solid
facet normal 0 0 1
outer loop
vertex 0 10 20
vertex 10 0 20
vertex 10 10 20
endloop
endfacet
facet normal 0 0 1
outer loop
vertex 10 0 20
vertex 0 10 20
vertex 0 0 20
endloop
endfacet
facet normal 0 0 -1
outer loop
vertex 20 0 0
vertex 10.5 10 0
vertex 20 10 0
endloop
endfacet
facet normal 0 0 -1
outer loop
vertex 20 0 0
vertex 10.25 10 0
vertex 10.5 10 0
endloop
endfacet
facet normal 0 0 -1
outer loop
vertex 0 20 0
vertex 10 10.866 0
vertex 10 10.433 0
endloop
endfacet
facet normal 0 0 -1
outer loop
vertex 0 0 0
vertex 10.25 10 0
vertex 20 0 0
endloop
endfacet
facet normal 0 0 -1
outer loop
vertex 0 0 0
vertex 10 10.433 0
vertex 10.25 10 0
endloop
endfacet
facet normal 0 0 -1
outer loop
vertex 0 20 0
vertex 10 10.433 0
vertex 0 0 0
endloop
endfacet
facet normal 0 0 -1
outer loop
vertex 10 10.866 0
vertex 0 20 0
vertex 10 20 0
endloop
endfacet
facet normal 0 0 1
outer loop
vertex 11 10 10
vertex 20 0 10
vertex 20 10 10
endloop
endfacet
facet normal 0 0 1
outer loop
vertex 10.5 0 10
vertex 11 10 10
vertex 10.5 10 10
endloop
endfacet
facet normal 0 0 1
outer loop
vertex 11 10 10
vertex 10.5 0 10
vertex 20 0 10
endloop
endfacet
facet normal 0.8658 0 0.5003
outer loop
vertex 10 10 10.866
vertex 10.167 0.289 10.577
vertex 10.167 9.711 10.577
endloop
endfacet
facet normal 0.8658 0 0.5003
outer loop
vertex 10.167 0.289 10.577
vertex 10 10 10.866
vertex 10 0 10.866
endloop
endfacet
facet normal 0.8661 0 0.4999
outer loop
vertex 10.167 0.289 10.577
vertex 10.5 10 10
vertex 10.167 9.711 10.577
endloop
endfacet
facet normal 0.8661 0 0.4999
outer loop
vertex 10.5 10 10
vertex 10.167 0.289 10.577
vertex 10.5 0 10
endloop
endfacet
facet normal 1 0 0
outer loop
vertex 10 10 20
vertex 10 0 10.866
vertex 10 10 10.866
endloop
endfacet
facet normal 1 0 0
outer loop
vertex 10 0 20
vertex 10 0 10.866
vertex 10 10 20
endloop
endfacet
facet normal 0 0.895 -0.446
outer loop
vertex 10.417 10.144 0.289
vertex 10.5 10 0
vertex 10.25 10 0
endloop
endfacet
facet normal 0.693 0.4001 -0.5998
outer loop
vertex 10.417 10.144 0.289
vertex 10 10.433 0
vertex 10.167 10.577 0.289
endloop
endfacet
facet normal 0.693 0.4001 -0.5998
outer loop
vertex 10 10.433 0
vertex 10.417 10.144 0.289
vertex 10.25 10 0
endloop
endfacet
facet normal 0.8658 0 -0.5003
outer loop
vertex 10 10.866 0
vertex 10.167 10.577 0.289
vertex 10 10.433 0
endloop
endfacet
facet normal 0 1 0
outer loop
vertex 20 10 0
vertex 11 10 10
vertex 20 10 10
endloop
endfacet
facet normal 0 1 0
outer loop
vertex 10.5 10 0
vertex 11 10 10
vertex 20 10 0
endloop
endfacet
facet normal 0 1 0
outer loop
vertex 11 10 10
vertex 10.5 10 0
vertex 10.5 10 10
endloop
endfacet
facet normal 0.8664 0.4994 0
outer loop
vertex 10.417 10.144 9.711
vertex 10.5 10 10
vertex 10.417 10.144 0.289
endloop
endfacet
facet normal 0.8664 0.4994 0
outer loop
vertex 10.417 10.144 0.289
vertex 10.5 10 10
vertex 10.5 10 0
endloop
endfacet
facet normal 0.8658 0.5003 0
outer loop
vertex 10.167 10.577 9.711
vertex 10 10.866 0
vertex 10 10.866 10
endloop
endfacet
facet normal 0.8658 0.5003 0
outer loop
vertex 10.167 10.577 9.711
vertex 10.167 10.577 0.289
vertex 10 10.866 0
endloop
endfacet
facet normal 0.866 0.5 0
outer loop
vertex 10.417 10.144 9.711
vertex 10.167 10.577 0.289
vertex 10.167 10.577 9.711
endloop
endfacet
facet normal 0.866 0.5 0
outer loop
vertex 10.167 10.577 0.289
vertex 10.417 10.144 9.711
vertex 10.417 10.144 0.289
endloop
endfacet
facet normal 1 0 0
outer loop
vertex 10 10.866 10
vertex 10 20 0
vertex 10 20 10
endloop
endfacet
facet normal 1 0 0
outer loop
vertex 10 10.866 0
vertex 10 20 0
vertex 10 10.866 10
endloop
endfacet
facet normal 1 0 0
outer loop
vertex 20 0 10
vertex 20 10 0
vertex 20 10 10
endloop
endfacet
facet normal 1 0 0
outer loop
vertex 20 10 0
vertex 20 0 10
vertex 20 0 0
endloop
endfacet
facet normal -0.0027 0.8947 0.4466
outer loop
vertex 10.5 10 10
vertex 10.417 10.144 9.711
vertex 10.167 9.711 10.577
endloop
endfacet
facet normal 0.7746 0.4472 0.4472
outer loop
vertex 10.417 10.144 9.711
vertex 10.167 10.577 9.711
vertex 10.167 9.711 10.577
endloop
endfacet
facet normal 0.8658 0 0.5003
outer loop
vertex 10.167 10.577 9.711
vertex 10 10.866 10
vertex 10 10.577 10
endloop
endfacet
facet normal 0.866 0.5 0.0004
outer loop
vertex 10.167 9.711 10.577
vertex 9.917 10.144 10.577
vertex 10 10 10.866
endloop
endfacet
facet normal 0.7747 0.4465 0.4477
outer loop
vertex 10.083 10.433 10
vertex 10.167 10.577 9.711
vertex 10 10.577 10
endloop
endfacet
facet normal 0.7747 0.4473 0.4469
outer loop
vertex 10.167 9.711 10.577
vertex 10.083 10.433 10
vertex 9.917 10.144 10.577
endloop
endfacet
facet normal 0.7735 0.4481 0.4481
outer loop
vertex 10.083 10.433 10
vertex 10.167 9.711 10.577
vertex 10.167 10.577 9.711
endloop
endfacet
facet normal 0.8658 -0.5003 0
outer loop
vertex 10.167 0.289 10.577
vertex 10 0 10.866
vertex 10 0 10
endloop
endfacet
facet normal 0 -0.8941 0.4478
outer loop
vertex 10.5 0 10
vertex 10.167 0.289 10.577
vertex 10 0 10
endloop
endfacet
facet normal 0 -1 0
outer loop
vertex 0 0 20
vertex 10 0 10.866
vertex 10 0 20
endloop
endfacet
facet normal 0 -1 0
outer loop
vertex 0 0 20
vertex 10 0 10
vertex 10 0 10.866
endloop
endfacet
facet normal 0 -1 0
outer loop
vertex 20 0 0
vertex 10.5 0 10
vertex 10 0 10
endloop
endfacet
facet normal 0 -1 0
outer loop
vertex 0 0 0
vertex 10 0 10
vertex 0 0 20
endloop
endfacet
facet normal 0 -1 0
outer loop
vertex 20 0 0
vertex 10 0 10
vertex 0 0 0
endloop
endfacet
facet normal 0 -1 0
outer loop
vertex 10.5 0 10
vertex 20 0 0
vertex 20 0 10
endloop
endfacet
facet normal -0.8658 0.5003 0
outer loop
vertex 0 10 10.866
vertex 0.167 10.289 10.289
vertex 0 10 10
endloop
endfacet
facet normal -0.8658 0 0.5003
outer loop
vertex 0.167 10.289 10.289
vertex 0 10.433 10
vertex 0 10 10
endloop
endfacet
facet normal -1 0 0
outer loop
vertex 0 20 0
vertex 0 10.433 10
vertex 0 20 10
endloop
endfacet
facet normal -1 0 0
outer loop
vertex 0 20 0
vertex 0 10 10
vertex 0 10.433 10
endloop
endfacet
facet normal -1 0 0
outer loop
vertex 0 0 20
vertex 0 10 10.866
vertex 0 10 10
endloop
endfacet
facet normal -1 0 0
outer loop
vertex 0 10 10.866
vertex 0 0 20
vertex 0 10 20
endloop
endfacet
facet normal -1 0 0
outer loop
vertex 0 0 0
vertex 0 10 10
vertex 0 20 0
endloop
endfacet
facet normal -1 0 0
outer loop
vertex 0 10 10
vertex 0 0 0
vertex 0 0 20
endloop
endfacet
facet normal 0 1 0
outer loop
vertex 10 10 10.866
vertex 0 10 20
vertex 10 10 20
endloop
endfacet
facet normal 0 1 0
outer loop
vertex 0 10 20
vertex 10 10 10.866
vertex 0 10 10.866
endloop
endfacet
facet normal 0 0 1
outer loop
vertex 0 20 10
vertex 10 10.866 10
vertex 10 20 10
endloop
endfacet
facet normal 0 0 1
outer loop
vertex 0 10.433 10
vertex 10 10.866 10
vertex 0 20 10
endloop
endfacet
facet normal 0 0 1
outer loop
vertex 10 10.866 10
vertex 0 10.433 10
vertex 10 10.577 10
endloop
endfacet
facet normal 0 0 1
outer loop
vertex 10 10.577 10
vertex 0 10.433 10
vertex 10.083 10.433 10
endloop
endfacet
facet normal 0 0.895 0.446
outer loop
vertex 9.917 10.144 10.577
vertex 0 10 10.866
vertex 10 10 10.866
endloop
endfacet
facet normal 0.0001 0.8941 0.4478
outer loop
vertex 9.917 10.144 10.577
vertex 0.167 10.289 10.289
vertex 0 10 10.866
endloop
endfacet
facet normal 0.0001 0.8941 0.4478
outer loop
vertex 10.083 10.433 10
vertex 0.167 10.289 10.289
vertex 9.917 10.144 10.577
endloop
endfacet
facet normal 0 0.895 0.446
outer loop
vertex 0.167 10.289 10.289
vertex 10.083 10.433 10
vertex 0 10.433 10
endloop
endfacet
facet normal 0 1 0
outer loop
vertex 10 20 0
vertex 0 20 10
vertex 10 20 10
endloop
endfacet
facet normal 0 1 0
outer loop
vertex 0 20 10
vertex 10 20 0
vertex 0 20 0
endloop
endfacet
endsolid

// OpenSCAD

// by: Scorch
// http://www.scorchworks.com/Blog/openscad-modules-for-automatic-fillets-and-radii/
// www.scorchworks.com
// 12/29/2015

// PARAMETERS

sample_R    = 1;      // Radius of the fillet/round to be added

sample_OB   = 1000;   // Outer boundary (should be larger than model outer boundary)

sample_axis = "xyz";  // ["xyz":"xyz",x:x,y:y,z:z]
                      // axes to round choose one (x,y,z, or xyz)

sample_fn   = 6;      // number of facets on radius (per 360 degrees)

MAKE_EXAMPLE = 1;    // [0:Generate sample base part,1: Add fillets to base part,2: Add rounds to base part,3: Add fillets and rounds to base part,4: Add local fillets to base part,5: Add local rounds to base part,6: Add local fillets and local rounds to base part, 7: Show transparent local area selection box on base part]

//-1: Do not make example part
// 0: Generate sample base part
// 1: Add fillets to base part 
// 2: Add rounds to base part 
// 3: Add fillets and rounds to base part 
// 4: Add local fillets to base part 
// 5: Add local rounds to base part 
// 6: Add local fillets and local rounds to base part 
// 7: Show transparent local area selection box on base part 
//

//////////////////////////////////////////////////////////////////////////
//////////////////////////////////////////////////////////////////////////

// The add_fillets module will either auto fillet the whole model or
// a section of the model depending on if ther are one or two children.
// 1 child:       Fillet the whole model
// Two children:  Fillet the first child in the area that is
//                 intersected by the second child 
module add_fillets(R=1,OB=1000,axis="xyz",fn=10)
{
    fn_even = ceil(fn/2)*2;
    if ($children==1)
    {
        minkowski_fillets(R=R,OB=OB,axis=axis,fn=fn_even)
        {
            children(0);
        }
    }
    if ($children==2)
    {
        union()
        {
            minkowski_fillets(R=R,OB=OB,axis=axis,fn=fn_even)
            {
                intersection()
                {
                    children(0);
                    children(1);
                }
            }
            difference()
            {
                children(0);
                children(1);
            }
        }
    }
}


// The add_rounds module will either auto round the whole model or
// a section of the model depending on if ther are one or two children.
// 1 child:       Round the whole model
// Two children:  Round the first child in the area that is
//                  intersected by the second child 
module add_rounds(R=1,OB=1000,axis="xyz",fn=10)
{
    fn_even = ceil(fn/2)*2;
    if ($children==1)
    {
        minkowski_rounds(R=R,OB=OB,axis=axis,fn=fn_even)
        {
            children(0);
        }
    }
    if ($children==2)
    {
        union()
        {
            minkowski_rounds(R=R,OB=OB,axis=axis,fn=fn_even)
            {
                intersection()
                {
                    children(0);
                    minkowski()
                    {
                        children(1);
                        if (axis=="x")   rotate([0 ,90,0]) cylinder(r=R,$fn=fn_even,center=true);
                        if (axis=="y")   rotate([90,0 ,0]) cylinder(r=R,$fn=fn_even,center=true);
                        if (axis=="z")   rotate([0 ,0 ,0]) cylinder(r=R,$fn=fn_even,center=true);
                        if (axis=="xyz") sphere(r=R,$fn=fn_even);
                    }
                }
            }
            difference()
            {
                children(0);
                children(1);
            }
        }
    }
}




module minkowski_fillets(R=1,OB=1000,axis="xyz",fn=10)
{
    OBplus=OB+4*R;
    fn_even = ceil(fn/2)*2;
    echo(fn_even);
    difference()
    {
        cube([OB,OB,OB],center=true);
        minkowski()
        {   
            difference()
            {
                cube([OBplus,OBplus,OBplus],center=true);
                minkowski()
                {
                    children(0);
                    if (axis=="x")   rotate([0 ,90,0]) cylinder(r=R,$fn=fn_even,center=true);
                    if (axis=="y")   rotate([90,0 ,0]) cylinder(r=R,$fn=fn_even,center=true);
                    if (axis=="z")   rotate([0 ,0 ,0]) cylinder(r=R,$fn=fn_even,center=true);
                    if (axis=="xyz") sphere(r=R,$fn=fn);
                }
            }
            if (axis=="x")   rotate([0 ,90,0]) cylinder(r=R,$fn=fn_even,center=true);
            if (axis=="y")   rotate([90,0 ,0]) cylinder(r=R,$fn=fn_even,center=true);
            if (axis=="z")   rotate([0 ,0 ,0]) cylinder(r=R,$fn=fn_even,center=true);
            if (axis=="xyz") sphere(r=R,$fn=fn_even);
        }
    }
}


module minkowski_rounds(R=1,OB=1000,axis="xyz",fn=10)
{
    OBplus=OB+4*R;
    fn_even = ceil(fn/2)*2;
    minkowski()
    {  
        difference()
        {
            cube([OB,OB,OB],center=true);
            minkowski()
            {
                difference()
                {
                    cube([OBplus,OBplus,OBplus],center=true);
                    children(0);
                }
                if (axis=="x")   rotate([0 ,90,0]) cylinder(r=R,$fn=fn_even,center=true);
                if (axis=="y")   rotate([90,0 ,0]) cylinder(r=R,$fn=fn_even,center=true);
                if (axis=="z")   rotate([0 ,0 ,0]) cylinder(r=R,$fn=fn_even,center=true);
                if (axis=="xyz") sphere(r=R,$fn=fn_even);
            }
        }
        if (axis=="x")   rotate([0 ,90,0]) cylinder(r=R,$fn=fn,center=true);
        if (axis=="y")   rotate([90,0 ,0]) cylinder(r=R,$fn=fn,center=true);
        if (axis=="z")   rotate([0 ,0 ,0]) cylinder(r=R,$fn=fn,center=true);
        if (axis=="xyz") sphere(r=R,$fn=fn_even);      
    }
}

//////////////////////////////////////////////////////////
//The remainder of this file contains the Sample models //
//////////////////////////////////////////////////////////
// ------------------------------   
// Base sample object
// ------------------------------
if (MAKE_EXAMPLE==0)
    fillets_and_rounds_sample_object();

// ------------------------------   
// Sample add fillets
// ------------------------------
if (MAKE_EXAMPLE==1)
    render()
        add_fillets(R=sample_R,OB=sample_OB,axis=sample_axis,fn=sample_fn)
            fillets_and_rounds_sample_object();

// ------------------------------   
// Sample add rounds
// ------------------------------
if (MAKE_EXAMPLE==2)
    render()
        add_rounds(R=sample_R,OB=sample_OB,axis=sample_axis,fn=sample_fn)
            fillets_and_rounds_sample_object();
   
// ------------------------------   
// Sample add rounds and fillets
// ------------------------------
if (MAKE_EXAMPLE==3)
{
    render()
        add_fillets(R=sample_R,OB=sample_OB,axis=sample_axis,fn=sample_fn)
            add_rounds(R=sample_R,OB=sample_OB,axis=sample_axis,fn=sample_fn)
                fillets_and_rounds_sample_object();
}       

// ------------------------------   
// Sample add local fillets
// ------------------------------
if (MAKE_EXAMPLE==4)
{
    render()
        add_fillets(R=sample_R,OB=sample_OB,axis=sample_axis,fn=sample_fn)
        {
            fillets_and_rounds_sample_object();
            translate([10,10,0])cube([10,10,50],center=true);
        }
}

// ------------------------------   
// Sample add local rounds
// ------------------------------
if (MAKE_EXAMPLE==5)
{
    render()
        add_rounds(R=sample_R,OB=sample_OB,axis=sample_axis,fn=sample_fn)
        {
            fillets_and_rounds_sample_object();
            translate([10,10,0])cube([10,10,50],center=true);
        }
}

// ------------------------------   
// Sample add rounds and fillets
// ------------------------------
if (MAKE_EXAMPLE==6)
{
    render()
        add_fillets(R=sample_R,OB=sample_OB,axis=sample_axis,fn=sample_fn)
        {
            add_rounds(R=sample_R,OB=sample_OB,axis=sample_axis,fn=sample_fn)
            {
                fillets_and_rounds_sample_object();
                translate([10,10,0])cube([10,10,50],center=true);
            }
            translate([10,10,0])cube([10,10,50],center=true);
        }
}


// ------------------------------   
// Sample Show Intersecting Box
// ------------------------------
if (MAKE_EXAMPLE==7)
{
    fillets_and_rounds_sample_object();
    %translate([10,10,0])cube([10,10,50],center=true);

}

// -------------------
// Sample Object module
// -------------------
module fillets_and_rounds_sample_object()
{
    cube([10,20,10]);
    cube([20,10,10]);
    cube([10,10,20]);
}

// END
